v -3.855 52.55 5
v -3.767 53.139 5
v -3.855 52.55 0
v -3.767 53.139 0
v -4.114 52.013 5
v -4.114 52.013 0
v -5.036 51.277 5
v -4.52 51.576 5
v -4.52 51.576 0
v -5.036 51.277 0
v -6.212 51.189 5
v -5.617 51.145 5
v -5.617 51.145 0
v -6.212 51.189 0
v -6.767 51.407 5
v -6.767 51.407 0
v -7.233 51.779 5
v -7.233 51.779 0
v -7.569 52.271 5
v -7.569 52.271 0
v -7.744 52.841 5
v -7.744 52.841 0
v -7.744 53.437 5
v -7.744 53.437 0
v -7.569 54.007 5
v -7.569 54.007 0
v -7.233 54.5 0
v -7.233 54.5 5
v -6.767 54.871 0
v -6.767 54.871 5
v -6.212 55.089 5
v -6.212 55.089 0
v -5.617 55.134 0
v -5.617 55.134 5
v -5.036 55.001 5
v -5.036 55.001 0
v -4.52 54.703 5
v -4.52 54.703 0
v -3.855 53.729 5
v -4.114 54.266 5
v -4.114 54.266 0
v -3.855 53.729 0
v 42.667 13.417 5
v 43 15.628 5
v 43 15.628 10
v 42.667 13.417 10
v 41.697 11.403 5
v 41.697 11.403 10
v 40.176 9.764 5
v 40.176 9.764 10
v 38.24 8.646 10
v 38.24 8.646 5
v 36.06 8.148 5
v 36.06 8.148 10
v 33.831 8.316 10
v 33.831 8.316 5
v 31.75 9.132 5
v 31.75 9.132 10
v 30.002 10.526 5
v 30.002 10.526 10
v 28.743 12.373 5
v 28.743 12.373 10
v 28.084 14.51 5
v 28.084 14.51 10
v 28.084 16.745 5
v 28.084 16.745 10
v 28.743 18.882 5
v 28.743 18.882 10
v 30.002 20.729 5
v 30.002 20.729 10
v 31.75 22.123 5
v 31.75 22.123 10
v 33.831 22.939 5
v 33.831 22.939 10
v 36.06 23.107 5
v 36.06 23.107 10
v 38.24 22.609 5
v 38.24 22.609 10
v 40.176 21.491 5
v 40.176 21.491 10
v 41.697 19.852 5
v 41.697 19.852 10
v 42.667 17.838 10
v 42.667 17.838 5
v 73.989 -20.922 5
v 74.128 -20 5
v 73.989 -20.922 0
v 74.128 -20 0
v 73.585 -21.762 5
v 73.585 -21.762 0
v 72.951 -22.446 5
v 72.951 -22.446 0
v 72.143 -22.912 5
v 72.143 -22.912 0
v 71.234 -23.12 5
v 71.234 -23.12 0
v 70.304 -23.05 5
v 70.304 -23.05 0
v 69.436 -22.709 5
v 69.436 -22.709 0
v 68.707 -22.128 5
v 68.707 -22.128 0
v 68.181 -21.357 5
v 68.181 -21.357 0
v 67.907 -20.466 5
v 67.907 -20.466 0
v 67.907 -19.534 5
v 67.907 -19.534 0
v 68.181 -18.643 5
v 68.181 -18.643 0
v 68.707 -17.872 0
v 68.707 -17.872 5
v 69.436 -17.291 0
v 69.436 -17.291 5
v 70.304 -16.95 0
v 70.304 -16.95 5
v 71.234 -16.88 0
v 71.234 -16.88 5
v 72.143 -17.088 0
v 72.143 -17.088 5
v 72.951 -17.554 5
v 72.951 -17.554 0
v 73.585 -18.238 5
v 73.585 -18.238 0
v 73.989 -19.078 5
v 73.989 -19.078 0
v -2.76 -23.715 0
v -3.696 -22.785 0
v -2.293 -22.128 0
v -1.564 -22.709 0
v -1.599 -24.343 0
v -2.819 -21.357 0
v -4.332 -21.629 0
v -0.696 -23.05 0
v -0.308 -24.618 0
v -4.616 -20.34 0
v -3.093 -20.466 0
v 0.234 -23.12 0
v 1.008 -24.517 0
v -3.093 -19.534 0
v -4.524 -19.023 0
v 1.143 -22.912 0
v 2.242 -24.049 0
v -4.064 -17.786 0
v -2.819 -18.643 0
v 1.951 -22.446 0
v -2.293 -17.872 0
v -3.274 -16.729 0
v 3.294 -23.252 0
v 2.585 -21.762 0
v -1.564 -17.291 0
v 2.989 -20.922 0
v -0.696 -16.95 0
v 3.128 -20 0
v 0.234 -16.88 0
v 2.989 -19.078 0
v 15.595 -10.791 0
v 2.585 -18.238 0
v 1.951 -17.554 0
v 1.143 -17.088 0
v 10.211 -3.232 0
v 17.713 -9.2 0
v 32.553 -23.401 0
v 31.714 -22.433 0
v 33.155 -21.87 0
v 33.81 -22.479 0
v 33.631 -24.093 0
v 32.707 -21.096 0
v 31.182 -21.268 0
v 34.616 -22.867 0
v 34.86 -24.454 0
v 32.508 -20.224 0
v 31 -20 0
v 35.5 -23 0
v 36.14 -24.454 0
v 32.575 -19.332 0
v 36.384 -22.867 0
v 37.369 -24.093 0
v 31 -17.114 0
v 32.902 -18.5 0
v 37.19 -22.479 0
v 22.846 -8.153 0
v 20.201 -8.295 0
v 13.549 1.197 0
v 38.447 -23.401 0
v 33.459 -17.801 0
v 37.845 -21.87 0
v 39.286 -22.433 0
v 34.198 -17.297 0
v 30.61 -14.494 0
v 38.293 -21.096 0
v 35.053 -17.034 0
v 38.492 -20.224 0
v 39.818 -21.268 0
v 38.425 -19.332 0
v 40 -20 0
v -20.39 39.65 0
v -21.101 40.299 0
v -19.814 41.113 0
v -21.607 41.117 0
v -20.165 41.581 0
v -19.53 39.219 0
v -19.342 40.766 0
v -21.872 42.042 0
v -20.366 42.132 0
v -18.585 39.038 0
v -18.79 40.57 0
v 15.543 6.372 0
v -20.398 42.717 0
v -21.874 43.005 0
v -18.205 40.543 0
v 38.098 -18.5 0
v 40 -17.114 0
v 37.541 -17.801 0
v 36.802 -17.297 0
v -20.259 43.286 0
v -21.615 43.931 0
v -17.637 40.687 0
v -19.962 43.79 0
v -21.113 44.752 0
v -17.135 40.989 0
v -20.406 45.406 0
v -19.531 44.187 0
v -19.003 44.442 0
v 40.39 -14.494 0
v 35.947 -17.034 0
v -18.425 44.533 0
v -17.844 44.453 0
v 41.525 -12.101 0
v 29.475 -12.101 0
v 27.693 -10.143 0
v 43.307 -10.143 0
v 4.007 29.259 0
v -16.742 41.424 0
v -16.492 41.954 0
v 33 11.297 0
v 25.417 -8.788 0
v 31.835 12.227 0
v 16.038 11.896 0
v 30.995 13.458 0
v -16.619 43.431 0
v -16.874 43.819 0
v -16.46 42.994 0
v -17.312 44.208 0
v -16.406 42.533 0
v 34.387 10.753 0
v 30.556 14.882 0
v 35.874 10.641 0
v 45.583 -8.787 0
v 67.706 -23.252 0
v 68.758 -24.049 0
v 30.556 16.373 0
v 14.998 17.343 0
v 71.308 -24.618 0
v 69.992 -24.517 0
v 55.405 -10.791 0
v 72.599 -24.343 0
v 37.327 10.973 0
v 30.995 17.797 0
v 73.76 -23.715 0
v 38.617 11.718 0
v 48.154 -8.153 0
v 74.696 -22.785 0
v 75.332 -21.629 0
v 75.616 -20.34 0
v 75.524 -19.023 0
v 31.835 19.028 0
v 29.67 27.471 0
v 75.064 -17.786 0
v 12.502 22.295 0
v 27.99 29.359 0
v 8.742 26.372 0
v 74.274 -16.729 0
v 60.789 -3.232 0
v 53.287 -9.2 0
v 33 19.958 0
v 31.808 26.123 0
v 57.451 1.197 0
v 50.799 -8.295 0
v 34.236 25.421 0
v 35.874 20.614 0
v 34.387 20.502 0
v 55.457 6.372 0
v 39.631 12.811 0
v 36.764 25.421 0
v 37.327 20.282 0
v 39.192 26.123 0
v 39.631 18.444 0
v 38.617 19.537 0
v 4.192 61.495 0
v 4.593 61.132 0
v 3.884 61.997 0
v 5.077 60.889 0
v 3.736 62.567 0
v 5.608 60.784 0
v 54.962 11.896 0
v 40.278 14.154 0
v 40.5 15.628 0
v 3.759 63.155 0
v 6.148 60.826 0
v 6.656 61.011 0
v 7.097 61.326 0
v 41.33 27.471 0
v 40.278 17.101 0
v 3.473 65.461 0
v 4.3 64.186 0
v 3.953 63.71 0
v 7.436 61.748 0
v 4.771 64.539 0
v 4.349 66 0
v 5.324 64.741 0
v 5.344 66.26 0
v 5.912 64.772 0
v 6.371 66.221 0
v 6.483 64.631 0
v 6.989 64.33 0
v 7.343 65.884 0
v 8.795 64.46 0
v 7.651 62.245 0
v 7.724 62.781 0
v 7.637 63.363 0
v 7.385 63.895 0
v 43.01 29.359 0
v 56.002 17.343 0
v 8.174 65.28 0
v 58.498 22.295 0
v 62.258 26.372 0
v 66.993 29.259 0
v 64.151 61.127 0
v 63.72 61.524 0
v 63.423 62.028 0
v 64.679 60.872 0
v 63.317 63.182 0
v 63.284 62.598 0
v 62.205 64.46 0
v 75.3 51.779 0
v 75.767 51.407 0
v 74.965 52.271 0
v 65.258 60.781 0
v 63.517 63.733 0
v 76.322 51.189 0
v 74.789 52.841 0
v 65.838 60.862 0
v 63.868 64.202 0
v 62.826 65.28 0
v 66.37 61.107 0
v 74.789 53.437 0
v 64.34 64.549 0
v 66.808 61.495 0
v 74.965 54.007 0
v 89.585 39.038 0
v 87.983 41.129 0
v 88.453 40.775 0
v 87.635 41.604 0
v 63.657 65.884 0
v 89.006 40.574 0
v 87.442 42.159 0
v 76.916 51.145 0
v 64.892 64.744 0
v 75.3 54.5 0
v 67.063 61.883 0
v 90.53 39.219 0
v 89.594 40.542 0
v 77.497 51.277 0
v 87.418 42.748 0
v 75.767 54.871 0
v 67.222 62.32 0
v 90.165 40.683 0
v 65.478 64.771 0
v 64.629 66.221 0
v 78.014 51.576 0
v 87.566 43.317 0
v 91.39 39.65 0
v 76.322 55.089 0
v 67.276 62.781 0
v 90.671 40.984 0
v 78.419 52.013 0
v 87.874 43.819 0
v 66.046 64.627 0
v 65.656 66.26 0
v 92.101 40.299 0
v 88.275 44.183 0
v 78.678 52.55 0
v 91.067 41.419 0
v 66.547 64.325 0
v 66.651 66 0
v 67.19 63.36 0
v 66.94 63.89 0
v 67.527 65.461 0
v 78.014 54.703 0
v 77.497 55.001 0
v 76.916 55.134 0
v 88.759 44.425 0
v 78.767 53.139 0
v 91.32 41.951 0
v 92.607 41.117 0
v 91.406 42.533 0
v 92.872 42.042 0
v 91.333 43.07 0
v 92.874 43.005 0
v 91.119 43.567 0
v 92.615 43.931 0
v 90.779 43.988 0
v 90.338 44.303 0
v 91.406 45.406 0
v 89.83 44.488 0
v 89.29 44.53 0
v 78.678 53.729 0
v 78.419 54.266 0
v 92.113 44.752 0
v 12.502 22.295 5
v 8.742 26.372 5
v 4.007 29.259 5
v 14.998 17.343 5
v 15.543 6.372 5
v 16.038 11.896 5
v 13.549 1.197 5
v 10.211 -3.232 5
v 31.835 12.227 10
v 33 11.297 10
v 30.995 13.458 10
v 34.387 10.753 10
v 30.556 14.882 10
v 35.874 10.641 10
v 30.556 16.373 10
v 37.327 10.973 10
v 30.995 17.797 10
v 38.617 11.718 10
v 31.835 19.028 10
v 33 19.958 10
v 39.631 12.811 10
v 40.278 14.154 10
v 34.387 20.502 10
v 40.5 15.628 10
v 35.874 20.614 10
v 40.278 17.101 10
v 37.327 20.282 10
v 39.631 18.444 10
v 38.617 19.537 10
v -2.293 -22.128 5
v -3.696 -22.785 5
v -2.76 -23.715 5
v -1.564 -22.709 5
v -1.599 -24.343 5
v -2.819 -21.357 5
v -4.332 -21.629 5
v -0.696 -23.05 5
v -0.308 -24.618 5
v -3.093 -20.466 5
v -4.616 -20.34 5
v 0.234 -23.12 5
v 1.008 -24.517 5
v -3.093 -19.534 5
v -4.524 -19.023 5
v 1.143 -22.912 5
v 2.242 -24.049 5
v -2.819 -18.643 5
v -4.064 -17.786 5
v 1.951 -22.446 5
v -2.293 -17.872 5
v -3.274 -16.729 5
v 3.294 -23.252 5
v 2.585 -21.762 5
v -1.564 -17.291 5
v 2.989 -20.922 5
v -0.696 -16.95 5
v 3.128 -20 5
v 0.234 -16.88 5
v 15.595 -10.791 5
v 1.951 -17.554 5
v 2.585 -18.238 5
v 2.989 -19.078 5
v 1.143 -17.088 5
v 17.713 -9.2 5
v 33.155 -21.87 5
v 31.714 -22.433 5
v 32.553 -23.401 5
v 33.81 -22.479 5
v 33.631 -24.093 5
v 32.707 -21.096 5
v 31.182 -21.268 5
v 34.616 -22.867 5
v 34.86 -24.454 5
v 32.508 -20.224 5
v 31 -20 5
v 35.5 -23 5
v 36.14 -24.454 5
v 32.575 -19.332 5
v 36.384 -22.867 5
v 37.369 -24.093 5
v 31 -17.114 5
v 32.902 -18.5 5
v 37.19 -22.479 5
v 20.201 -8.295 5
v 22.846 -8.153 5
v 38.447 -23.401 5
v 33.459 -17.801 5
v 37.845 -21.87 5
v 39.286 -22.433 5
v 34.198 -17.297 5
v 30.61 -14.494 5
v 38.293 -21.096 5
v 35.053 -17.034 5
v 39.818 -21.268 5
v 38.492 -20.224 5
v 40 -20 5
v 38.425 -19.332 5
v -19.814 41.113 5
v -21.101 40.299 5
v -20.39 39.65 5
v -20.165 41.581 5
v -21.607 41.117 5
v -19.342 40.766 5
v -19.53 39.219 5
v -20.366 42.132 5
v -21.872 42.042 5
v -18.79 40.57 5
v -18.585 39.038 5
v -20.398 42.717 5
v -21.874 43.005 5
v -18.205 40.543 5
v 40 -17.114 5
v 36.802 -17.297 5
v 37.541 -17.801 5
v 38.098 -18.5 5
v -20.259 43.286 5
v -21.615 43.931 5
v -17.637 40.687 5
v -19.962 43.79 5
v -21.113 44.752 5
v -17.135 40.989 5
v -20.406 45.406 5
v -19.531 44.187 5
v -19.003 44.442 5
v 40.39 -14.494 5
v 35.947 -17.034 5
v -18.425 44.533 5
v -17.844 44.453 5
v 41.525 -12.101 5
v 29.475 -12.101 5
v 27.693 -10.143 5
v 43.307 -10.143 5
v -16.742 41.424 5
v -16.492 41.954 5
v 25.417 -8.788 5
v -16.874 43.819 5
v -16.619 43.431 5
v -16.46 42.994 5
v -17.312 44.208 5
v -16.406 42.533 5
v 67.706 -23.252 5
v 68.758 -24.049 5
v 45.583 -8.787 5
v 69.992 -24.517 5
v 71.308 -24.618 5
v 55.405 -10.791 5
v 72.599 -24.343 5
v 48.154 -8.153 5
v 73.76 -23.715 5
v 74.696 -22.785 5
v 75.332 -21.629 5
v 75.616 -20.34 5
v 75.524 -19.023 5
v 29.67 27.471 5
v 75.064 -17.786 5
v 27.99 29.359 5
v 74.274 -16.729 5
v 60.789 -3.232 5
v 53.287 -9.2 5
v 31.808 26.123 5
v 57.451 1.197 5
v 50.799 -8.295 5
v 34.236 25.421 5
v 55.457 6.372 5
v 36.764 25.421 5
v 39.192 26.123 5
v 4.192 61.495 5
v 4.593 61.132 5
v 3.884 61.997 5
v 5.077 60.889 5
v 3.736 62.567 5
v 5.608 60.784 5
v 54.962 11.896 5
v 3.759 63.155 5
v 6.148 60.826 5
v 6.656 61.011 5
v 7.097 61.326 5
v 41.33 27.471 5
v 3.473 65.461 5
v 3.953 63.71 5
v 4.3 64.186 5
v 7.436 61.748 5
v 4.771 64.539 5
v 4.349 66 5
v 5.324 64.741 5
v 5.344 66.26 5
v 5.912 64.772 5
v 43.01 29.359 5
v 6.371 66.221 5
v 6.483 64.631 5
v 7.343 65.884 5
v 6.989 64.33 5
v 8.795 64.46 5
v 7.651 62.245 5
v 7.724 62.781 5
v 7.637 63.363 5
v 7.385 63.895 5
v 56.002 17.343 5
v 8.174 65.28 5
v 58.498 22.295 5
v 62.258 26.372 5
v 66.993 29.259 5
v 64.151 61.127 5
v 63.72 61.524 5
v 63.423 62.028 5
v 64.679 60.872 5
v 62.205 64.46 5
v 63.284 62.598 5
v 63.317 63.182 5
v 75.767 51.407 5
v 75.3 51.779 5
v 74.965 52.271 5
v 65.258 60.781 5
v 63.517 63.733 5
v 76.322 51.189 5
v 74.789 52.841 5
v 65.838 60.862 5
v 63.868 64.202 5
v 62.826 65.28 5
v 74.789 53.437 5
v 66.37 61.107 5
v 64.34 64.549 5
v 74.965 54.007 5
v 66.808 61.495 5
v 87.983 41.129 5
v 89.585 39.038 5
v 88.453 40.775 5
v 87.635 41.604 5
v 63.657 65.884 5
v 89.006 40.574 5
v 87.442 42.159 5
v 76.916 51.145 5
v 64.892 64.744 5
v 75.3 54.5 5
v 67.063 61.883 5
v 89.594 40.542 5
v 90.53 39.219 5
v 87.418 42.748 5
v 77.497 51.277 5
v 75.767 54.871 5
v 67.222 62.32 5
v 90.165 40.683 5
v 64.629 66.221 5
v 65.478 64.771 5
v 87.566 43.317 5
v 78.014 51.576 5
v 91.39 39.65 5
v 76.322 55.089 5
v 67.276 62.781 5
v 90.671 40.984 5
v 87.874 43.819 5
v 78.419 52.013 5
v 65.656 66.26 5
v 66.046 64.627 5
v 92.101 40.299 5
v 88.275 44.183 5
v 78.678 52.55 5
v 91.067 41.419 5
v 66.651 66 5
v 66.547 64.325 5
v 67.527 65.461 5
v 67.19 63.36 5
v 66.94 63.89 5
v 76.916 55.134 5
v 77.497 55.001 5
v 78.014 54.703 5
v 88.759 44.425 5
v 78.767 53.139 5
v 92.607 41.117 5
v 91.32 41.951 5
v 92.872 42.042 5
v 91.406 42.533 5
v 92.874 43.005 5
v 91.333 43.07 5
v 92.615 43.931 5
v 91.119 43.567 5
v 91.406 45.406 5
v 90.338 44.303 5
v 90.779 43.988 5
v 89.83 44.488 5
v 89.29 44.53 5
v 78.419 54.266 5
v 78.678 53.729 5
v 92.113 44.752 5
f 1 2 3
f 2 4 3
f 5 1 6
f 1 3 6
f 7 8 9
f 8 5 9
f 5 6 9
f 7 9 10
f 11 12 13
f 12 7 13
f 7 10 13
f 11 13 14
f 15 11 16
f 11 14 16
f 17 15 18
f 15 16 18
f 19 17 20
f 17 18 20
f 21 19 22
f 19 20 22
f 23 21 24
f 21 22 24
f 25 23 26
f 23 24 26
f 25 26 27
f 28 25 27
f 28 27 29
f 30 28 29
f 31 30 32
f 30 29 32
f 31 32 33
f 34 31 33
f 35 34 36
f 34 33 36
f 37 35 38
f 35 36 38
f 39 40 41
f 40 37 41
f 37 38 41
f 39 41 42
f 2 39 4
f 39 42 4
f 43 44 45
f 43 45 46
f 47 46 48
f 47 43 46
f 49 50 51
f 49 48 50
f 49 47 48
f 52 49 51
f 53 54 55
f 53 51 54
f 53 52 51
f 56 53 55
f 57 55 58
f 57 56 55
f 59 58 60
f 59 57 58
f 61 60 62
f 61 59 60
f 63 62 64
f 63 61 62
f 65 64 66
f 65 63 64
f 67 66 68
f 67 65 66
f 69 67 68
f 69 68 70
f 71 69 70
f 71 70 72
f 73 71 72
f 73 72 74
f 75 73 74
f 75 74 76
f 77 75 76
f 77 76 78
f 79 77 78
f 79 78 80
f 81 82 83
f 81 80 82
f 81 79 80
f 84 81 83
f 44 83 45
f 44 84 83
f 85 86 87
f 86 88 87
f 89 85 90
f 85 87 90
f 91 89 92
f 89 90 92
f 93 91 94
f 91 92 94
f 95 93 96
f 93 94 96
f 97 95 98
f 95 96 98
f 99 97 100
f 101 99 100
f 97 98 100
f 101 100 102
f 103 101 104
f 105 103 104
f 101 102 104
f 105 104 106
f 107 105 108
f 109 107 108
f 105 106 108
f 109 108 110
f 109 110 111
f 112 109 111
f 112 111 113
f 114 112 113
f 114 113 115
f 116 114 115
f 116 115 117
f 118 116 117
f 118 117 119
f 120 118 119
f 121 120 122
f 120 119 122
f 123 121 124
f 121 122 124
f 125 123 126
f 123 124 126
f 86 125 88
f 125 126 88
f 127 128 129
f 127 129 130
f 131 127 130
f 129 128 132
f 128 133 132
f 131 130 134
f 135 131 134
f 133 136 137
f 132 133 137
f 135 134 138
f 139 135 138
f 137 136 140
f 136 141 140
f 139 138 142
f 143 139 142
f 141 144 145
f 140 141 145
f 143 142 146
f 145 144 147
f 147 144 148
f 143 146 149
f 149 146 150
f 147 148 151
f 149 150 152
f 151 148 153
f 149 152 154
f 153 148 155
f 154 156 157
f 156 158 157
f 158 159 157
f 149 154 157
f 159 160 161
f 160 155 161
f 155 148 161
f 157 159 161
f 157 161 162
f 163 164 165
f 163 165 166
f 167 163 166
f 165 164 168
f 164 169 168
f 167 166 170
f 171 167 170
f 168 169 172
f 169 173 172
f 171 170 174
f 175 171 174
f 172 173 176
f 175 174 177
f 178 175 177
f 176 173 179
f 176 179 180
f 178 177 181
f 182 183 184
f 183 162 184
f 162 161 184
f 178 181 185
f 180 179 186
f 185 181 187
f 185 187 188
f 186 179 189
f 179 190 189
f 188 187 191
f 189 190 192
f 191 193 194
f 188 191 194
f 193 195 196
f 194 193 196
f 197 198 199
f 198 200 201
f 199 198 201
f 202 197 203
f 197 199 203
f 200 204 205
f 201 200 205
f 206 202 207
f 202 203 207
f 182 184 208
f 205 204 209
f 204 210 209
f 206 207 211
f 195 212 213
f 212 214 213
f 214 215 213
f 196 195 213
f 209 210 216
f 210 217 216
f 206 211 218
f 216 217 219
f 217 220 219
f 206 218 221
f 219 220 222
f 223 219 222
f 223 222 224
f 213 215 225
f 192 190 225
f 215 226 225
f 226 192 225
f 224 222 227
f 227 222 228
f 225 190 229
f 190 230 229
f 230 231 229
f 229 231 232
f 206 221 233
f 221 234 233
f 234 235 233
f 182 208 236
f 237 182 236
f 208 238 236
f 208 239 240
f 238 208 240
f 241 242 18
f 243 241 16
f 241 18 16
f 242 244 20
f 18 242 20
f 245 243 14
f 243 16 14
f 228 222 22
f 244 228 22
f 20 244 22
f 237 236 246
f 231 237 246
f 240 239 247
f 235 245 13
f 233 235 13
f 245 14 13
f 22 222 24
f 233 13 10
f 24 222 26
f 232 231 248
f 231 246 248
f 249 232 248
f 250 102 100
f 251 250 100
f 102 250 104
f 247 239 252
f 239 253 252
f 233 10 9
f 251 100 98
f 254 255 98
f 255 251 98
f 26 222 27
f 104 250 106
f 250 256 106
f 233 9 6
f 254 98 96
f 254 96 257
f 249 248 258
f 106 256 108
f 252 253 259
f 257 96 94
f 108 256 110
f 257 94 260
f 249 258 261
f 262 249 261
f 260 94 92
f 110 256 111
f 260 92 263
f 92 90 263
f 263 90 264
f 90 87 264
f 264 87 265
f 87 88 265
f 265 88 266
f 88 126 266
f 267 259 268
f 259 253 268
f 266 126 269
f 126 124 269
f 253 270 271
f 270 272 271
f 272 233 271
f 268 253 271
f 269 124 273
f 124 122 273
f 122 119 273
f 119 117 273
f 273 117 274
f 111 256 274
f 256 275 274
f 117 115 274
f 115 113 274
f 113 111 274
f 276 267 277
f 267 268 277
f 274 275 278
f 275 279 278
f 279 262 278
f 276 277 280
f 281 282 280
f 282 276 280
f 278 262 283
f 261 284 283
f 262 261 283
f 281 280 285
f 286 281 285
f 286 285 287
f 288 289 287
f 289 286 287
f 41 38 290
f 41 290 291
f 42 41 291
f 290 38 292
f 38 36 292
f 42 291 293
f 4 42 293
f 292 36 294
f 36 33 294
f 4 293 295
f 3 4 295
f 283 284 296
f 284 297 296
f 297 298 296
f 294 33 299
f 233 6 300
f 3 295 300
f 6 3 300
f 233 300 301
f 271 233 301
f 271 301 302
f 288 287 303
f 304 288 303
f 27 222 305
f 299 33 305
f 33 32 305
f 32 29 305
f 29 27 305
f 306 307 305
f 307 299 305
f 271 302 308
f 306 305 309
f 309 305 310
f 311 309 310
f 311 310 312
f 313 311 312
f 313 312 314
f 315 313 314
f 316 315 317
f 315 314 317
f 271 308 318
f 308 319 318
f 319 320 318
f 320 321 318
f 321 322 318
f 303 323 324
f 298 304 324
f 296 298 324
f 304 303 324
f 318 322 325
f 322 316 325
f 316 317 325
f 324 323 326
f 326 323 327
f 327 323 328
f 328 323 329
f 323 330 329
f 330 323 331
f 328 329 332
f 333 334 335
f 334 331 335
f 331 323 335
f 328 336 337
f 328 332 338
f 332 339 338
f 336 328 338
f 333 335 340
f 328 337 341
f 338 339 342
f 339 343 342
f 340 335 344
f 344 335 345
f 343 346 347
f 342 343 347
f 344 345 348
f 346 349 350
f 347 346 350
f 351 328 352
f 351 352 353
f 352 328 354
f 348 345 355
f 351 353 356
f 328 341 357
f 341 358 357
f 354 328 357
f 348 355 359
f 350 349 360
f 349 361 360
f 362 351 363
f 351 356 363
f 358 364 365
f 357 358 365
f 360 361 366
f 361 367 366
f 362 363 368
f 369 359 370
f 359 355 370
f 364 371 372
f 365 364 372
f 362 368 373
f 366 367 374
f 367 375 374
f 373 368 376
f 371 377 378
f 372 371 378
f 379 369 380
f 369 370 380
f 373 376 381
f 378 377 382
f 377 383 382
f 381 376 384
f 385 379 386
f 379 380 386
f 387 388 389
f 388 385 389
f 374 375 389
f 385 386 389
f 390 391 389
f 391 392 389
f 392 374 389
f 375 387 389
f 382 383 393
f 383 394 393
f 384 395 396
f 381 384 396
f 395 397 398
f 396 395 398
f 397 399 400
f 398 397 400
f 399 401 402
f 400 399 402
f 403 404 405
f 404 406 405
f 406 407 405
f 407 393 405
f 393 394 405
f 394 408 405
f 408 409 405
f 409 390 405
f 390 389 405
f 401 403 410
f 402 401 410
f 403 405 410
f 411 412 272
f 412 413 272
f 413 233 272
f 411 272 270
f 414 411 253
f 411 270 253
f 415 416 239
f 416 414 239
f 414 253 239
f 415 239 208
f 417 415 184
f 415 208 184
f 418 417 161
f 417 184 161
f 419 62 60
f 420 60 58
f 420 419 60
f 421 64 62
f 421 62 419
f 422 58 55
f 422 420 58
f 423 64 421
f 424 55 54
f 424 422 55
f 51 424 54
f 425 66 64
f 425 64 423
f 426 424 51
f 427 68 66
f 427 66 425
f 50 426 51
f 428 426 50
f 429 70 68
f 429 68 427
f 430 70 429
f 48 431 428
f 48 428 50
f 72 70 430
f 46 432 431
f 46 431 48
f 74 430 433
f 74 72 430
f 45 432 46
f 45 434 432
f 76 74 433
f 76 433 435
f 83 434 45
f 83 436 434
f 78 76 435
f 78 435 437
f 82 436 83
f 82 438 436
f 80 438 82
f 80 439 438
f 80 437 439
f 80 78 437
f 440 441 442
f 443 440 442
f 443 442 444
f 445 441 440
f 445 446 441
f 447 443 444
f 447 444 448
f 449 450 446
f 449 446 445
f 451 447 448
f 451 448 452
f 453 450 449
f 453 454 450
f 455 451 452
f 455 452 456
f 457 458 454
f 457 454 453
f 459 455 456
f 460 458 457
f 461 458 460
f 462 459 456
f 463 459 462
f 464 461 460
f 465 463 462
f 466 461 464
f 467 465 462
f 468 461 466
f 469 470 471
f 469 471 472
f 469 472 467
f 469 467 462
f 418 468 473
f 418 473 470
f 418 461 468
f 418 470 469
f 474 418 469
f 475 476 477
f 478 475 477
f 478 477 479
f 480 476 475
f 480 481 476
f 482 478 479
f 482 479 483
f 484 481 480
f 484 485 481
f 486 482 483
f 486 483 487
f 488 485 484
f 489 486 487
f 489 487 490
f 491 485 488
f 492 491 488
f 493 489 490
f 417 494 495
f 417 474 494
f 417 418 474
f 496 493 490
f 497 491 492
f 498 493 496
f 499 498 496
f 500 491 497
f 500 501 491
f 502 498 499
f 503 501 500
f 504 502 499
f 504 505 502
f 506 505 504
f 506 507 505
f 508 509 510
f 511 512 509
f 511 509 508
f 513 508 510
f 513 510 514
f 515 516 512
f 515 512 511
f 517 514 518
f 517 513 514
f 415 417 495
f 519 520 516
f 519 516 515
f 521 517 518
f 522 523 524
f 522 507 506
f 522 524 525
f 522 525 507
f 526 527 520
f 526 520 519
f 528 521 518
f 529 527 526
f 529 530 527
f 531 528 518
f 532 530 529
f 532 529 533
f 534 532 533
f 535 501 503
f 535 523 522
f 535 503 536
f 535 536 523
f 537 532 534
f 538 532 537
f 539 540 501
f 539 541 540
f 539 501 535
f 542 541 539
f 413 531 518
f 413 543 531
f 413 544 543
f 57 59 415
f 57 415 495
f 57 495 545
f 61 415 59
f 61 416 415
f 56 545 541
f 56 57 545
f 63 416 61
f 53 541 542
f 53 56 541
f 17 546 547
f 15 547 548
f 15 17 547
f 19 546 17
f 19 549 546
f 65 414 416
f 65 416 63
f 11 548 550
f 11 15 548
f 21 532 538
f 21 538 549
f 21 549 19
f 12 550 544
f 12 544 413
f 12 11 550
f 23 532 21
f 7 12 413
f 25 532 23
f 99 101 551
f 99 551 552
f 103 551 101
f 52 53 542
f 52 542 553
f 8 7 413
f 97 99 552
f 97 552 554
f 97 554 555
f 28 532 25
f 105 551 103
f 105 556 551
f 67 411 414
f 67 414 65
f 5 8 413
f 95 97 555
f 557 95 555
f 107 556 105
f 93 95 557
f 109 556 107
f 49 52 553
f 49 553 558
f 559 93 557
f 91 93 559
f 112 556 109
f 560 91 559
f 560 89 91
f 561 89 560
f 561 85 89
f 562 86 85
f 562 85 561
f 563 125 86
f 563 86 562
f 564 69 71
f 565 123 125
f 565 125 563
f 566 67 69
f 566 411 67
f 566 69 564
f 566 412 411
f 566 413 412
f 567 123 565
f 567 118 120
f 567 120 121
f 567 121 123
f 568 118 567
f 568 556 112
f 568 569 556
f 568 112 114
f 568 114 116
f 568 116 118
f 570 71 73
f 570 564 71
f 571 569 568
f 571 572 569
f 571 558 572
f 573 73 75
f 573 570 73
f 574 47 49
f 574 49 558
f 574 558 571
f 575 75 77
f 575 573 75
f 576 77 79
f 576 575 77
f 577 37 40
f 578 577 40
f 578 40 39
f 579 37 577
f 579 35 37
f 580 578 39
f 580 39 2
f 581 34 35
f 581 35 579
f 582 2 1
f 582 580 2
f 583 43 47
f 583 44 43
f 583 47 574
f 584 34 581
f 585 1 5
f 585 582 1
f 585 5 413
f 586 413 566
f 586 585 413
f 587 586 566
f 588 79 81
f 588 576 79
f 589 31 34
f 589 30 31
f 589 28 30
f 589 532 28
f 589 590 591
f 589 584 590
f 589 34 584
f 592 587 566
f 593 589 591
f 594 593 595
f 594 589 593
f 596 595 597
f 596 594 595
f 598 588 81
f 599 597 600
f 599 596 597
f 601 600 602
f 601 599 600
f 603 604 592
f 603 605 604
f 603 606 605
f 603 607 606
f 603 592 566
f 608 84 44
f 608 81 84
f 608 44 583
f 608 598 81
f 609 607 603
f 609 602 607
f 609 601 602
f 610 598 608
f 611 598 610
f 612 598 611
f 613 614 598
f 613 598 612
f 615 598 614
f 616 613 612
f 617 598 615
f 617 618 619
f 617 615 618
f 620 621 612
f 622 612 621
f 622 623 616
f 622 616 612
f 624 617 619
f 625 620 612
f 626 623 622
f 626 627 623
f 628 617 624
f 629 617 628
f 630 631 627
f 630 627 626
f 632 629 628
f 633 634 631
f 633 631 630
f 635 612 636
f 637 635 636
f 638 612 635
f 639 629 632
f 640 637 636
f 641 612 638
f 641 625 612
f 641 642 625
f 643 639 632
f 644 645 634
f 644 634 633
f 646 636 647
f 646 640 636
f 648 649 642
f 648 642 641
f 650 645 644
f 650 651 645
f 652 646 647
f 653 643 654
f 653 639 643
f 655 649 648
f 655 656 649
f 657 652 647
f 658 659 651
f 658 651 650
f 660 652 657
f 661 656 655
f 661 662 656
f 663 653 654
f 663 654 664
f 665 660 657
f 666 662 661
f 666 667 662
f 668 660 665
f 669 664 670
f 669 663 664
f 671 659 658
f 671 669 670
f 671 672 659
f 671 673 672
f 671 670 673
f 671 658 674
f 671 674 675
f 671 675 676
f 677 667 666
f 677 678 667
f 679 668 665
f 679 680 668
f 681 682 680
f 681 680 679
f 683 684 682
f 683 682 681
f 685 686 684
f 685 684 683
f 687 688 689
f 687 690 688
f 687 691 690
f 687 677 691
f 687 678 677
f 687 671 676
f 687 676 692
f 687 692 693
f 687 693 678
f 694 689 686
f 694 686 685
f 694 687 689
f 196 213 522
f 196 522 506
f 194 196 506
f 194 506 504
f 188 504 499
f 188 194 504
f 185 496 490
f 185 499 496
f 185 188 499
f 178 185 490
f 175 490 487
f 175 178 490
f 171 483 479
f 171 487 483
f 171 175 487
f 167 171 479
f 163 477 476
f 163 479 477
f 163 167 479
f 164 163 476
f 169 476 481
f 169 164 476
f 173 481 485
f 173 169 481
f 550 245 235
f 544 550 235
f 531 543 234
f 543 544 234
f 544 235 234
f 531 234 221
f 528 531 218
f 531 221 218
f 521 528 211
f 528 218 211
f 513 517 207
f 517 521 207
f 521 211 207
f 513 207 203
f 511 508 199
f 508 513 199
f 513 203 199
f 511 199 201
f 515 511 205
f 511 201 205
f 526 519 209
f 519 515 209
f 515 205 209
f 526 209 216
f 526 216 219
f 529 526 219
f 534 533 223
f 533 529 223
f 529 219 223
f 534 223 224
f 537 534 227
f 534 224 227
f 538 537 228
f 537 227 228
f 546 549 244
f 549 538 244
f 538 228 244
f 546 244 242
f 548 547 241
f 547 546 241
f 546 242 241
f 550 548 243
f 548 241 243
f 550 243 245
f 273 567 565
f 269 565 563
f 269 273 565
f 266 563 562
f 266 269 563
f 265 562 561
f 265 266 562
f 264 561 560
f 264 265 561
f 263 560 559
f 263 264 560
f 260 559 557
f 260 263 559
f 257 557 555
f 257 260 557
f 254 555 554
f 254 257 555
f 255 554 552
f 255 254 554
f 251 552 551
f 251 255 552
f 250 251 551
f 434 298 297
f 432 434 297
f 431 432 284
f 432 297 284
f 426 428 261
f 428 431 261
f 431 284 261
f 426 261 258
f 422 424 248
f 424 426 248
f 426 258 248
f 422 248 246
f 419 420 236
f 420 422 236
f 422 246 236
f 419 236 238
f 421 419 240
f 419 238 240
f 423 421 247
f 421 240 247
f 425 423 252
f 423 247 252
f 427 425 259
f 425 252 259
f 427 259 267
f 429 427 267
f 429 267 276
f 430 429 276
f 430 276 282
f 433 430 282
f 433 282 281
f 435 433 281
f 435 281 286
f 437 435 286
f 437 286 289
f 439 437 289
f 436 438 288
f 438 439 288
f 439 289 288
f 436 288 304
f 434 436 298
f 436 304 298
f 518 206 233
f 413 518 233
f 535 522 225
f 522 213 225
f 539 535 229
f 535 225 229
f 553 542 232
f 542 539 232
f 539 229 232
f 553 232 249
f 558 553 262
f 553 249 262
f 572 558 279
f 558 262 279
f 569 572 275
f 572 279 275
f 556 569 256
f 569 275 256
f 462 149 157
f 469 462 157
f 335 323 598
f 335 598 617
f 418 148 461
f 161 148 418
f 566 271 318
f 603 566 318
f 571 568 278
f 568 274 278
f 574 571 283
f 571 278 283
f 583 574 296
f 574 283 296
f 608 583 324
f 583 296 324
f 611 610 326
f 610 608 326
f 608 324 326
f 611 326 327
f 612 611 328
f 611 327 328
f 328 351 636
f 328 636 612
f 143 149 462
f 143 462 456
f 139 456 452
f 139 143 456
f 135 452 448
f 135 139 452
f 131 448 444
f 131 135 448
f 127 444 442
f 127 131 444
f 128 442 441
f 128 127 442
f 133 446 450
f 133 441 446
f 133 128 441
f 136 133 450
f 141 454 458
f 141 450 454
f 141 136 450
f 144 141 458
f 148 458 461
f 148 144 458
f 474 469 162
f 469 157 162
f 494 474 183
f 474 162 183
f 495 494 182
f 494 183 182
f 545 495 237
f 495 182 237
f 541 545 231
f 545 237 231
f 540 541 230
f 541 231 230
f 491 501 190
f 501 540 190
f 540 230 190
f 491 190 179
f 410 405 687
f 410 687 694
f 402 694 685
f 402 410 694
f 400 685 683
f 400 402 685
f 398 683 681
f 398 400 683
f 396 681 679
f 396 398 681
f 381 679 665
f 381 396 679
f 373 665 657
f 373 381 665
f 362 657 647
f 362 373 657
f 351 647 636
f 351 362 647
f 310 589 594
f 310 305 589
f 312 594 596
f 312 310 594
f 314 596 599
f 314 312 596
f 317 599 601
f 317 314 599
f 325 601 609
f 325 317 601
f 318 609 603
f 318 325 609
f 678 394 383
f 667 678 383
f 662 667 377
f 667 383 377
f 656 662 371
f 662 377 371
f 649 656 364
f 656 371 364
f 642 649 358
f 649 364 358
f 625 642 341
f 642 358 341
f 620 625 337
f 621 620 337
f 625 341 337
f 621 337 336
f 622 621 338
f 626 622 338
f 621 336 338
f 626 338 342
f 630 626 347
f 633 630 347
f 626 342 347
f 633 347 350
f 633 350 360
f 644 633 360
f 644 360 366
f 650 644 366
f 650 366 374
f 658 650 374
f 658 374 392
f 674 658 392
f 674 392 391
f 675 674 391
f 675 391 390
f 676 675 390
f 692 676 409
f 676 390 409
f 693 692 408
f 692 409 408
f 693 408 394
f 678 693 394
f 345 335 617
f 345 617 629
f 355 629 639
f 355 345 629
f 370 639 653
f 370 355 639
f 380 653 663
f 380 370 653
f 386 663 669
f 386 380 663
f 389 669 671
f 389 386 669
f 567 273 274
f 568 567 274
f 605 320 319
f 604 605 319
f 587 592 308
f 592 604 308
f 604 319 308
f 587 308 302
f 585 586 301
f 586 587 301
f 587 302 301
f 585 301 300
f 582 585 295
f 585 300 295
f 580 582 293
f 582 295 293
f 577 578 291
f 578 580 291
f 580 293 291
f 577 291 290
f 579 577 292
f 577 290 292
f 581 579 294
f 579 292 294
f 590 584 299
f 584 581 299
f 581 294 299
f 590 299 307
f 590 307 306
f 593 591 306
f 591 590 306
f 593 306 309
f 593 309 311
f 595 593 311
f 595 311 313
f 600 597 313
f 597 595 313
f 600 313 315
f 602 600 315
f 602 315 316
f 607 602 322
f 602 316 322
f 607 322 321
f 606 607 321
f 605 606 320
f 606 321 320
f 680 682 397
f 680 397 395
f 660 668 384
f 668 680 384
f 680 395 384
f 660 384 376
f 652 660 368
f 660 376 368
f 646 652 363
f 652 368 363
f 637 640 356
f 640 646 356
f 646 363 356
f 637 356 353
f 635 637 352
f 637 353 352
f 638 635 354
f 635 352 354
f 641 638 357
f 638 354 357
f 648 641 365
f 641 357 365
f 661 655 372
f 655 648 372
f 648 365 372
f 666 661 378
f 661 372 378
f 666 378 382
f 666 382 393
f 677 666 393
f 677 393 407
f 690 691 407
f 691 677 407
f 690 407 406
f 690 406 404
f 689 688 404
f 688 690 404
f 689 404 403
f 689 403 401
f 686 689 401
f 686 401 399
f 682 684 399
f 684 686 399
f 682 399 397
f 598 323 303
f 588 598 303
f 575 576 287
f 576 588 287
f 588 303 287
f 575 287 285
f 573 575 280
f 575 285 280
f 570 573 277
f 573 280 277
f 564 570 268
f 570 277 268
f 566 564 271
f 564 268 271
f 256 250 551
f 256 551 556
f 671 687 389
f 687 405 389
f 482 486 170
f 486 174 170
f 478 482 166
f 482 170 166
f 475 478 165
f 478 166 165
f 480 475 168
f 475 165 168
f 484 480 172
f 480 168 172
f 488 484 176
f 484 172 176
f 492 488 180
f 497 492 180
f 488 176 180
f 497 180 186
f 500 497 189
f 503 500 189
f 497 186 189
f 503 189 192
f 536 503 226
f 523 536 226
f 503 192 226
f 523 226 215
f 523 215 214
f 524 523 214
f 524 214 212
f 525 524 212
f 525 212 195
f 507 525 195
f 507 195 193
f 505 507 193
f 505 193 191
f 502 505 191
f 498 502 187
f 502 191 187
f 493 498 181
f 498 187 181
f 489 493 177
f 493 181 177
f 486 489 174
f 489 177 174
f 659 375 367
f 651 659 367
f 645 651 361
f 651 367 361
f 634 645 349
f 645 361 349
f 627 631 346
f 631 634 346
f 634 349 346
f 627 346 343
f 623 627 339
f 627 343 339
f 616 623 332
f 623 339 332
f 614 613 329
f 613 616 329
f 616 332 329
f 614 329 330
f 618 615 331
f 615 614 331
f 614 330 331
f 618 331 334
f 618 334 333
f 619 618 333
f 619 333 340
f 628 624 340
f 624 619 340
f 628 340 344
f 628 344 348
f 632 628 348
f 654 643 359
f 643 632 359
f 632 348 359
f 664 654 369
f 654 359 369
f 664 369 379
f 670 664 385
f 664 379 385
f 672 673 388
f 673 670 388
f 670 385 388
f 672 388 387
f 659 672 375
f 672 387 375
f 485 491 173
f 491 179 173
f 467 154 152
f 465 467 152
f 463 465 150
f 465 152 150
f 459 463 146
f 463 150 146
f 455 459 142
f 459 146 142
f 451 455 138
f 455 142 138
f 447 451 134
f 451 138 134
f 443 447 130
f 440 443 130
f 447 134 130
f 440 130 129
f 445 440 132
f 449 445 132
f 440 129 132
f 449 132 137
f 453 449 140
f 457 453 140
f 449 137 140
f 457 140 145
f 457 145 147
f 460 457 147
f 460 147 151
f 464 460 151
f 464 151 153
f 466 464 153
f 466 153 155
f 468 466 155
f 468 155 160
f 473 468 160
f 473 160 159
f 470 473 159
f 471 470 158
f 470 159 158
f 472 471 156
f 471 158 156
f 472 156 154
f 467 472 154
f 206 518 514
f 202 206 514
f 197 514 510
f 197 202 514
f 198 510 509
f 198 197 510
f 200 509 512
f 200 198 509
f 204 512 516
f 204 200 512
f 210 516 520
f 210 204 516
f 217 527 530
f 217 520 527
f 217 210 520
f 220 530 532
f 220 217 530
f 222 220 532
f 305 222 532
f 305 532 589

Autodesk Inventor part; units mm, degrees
ref_plane "YZ Plane" through (0, 0, 0) normal (1, 0, 0) x (0, 1, 0)
ref_plane "XZ Plane" through (0, 0, 0) normal (0, 1, 0) x (-1, 0, 0)
ref_plane "XY Plane" through (0, 0, 0) normal (0, 0, 1) x (1, 0, 0)
sketch "Sketch2" plane through (0, 0, 0) normal (0, 0, 1) x (1, 0, 0)
  circle A0 centre (-18.4063, 42.5332) radius 2
  circle A1 centre (-5.7666, 53.1392) radius 2
  circle A2 centre (5.7241, 62.781) radius 2
  circle A3 centre (0, -20) radius 3.1284
  arc A4 (35.5, -17) -> (35.5, -23) centre (35.5, -20) ccw
  circle A5 centre (-18.4063, 42.5332) radius 3.5
  circle A6 centre (5.7241, 62.781) radius 3.5
  line L0 (-18.4063, 42.5332) -> (-5.7666, 53.1392)
  line L1 (-5.7666, 53.1392) -> (5.7241, 62.781)
  line L2 (-20.4063, 45.4055) -> (3.4731, 65.4612)
  line L3 (-15.925, 40.0648) -> (7.9726, 60.0989)
  line L4 (-5.7666, 53.1392) -> (35.5, 15.6275)
  line L5 (-18.5849, 39.0378) -> (4.0074, 29.2589)
  circle A7 centre (0, -20) radius 4.6284
  arc A8 (35.5, -15.5) -> (35.5, -24.5) centre (35.5, -20) ccw
  line L6 (35.5, 15.6275) -> (0, -20)
  line L7 (-3.2742, -16.7286) -> (10.2111, -3.2315)
  line L8 (31, -17.1135) -> (31, -20)
  line L9 (3.2938, -23.2516) -> (15.5951, -10.7907)
  arc A9 (10.2111, -3.2315) -> (4.0074, 29.2589) centre (-3.9371, 10.9045) ccw
  arc A10 (31, -17.1135) -> (15.5951, -10.7907) centre (22, -17.1135) ccw
  line L10 (27.9905, 29.3594) -> (8.7949, 64.4604)
  circle A11 centre (89.4063, 42.5332) radius 2
  circle A12 centre (76.7666, 53.1392) radius 2
  circle A13 centre (65.2759, 62.781) radius 2
  circle A14 centre (71, -20) radius 3.1284
  arc A15 (35.5, -23) -> (35.5, -17) centre (35.5, -20) ccw
  circle A16 centre (89.4063, 42.5332) radius 3.5
  circle A17 centre (65.2759, 62.781) radius 3.5
  line L11 (89.4063, 42.5332) -> (76.7666, 53.1392)
  line L12 (76.7666, 53.1392) -> (65.2759, 62.781)
  line L13 (91.4063, 45.4055) -> (67.5269, 65.4612)
  line L14 (86.925, 40.0648) -> (63.0274, 60.0989)
  line L15 (76.7666, 53.1392) -> (35.5, 15.6275)
  line L16 (89.5849, 39.0378) -> (66.9926, 29.2589)
  circle A18 centre (71, -20) radius 4.6284
  arc A19 (35.5, -24.5) -> (35.5, -15.5) centre (35.5, -20) ccw
  line L17 (35.5, 15.6275) -> (71, -20)
  line L18 (74.2742, -16.7286) -> (60.7889, -3.2315)
  line L19 (40, -17.1135) -> (40, -20)
  line L20 (67.7062, -23.2516) -> (55.4049, -10.7907)
  arc A20 (66.9926, 29.2589) -> (60.7889, -3.2315) centre (74.9371, 10.9045) ccw
  arc A21 (55.4049, -10.7907) -> (40, -17.1135) centre (49, -17.1135) ccw
  line L21 (43.0095, 29.3594) -> (62.2051, 64.4604)
  arc A22 (27.9905, 29.3594) -> (43.0095, 29.3594) centre (35.5, 34.3477) ccw
  line L22 (0, -20) -> (6.5038, -20)
  line L23 (31, -20) -> (35.5, -20)
  line L24 (71, -20) -> (64.4962, -20)
  line L25 (40, -20) -> (35.5, -20)
  circle A23 centre (35.5, 15.6275) radius 5
  point P0 (86, -15)
  point P1 (105.5095, 35.5477)
  point P2 (56.8662, 76.3642)
  point P3 (31, 11.1114)
  point P4 (40, 11.1114)
  dimension "d40" = 7
  dimension "d41" = 7
  dimension "d42" = 11.4907
  dimension "d43" = 16.5
  dimension "d44" = 4
  dimension "d45" = 1.5
  dimension "d46" = 24.1304
  dimension "d47" = 1.5
  dimension "d48" = 1.5
  dimension "d49" = 1.5
  dimension "d51" = 20
  dimension "d52" = 9
  dimension "d54" = 9.2569
  dimension "d55" = 9.0153
  dimension "d56" = 4.5
  dimension "d57" = 0.026
  dimension "d58" = 0.026
  dimension "d59" = 63.405
  dimension "d60" = 5.025
  dimension "d61" = 97.729
  dimension "d62" = 5.369
  dimension "d63" = 5.103
  dimension "d65" = 78.673
  dimension "d66" = 21.327
  dimension "d67" = 94.897
  dimension "d68" = 94.631
  dimension "d69" = 2.271
  dimension "d70" = 94.975
  dimension "d71" = 16.595
  dimension "d72" = 100.026
  dimension "d73" = 0.026
  dimension "d74" = 4.9997
  dimension "d75" = 1.5216
  dimension "d76" = 9.5286
  dimension "d77" = 59.0451
  dimension "d78" = 32.3508
  dimension "d79" = 65.5095
  dimension "d80" = 81.4761
  dimension "d81" = 3.4859
  dimension "d82" = 3.4859
  dimension "d83" = 46.2625
  dimension "d84" = 49.7327
  dimension "d85" = 3.5
  dimension "d86" = 4.9997
  dimension "d87" = 8.5066
  dimension "d88" = 39.9151
  dimension "d89" = 40.9208
  dimension "d90" = 79.1063
  dimension "d91" = 80.2554
  dimension "d92" = 84.8517
  dimension "d93" = 86.0007
  dimension "d94" = 10
extrude "Extrusion1" add sketch "Sketch2" along normal blind 5 contours A5 | A5 L2 A6 L1 A1 L0 | L0 A1 L4 L3 A5 | L3 L4 A23 L6 A7 L7 A9 L5 A5 | A6 | L1 A6 L3 L4 A1 | L3 A6 L10 A22 L21 A17 L14 L15 A23 L4 | L15 L14 A16 L16 A20 L18 A18 L17 A23 | A23 L17 A18 L24 L20 A21 L19 A19 A8 L8 A10 L9 L22 A7 L6 | A7 L6 A3 L22 | L15 A12 L11 A16 L14 | L14 A17 L12 A12 L15 | A7 L22 A3 L6 | A7 L22 L9 | A17 | L17 A14 L24 A18 | A18 L24 A14 L17 | A16 | L13 A16 L11 A12 L12 A17 | A18 L20 L24 | L23 A4 A15 L25 A19 A8 | A8 A19 L25 A15 A4 L23
sketch "Sketch3" plane through (0, 0, 5) normal (0, 0, 1) x (1, 0, 0)
  point P0 (0, 0)
sketch "Sketch4" plane through (0, 0, 5) normal (0, 0, 1) x (1, 0, 0)
  circle A0 centre (35.5, 15.6275) radius 5 projected
  circle A1 centre (35.5, 15.6275) radius 7.5
  point P0 (0, 0)
  dimension "d97" = 15
extrude "Extrusion2" add sketch "Sketch4" along normal blind 5
properties part number "batteryclip2"
